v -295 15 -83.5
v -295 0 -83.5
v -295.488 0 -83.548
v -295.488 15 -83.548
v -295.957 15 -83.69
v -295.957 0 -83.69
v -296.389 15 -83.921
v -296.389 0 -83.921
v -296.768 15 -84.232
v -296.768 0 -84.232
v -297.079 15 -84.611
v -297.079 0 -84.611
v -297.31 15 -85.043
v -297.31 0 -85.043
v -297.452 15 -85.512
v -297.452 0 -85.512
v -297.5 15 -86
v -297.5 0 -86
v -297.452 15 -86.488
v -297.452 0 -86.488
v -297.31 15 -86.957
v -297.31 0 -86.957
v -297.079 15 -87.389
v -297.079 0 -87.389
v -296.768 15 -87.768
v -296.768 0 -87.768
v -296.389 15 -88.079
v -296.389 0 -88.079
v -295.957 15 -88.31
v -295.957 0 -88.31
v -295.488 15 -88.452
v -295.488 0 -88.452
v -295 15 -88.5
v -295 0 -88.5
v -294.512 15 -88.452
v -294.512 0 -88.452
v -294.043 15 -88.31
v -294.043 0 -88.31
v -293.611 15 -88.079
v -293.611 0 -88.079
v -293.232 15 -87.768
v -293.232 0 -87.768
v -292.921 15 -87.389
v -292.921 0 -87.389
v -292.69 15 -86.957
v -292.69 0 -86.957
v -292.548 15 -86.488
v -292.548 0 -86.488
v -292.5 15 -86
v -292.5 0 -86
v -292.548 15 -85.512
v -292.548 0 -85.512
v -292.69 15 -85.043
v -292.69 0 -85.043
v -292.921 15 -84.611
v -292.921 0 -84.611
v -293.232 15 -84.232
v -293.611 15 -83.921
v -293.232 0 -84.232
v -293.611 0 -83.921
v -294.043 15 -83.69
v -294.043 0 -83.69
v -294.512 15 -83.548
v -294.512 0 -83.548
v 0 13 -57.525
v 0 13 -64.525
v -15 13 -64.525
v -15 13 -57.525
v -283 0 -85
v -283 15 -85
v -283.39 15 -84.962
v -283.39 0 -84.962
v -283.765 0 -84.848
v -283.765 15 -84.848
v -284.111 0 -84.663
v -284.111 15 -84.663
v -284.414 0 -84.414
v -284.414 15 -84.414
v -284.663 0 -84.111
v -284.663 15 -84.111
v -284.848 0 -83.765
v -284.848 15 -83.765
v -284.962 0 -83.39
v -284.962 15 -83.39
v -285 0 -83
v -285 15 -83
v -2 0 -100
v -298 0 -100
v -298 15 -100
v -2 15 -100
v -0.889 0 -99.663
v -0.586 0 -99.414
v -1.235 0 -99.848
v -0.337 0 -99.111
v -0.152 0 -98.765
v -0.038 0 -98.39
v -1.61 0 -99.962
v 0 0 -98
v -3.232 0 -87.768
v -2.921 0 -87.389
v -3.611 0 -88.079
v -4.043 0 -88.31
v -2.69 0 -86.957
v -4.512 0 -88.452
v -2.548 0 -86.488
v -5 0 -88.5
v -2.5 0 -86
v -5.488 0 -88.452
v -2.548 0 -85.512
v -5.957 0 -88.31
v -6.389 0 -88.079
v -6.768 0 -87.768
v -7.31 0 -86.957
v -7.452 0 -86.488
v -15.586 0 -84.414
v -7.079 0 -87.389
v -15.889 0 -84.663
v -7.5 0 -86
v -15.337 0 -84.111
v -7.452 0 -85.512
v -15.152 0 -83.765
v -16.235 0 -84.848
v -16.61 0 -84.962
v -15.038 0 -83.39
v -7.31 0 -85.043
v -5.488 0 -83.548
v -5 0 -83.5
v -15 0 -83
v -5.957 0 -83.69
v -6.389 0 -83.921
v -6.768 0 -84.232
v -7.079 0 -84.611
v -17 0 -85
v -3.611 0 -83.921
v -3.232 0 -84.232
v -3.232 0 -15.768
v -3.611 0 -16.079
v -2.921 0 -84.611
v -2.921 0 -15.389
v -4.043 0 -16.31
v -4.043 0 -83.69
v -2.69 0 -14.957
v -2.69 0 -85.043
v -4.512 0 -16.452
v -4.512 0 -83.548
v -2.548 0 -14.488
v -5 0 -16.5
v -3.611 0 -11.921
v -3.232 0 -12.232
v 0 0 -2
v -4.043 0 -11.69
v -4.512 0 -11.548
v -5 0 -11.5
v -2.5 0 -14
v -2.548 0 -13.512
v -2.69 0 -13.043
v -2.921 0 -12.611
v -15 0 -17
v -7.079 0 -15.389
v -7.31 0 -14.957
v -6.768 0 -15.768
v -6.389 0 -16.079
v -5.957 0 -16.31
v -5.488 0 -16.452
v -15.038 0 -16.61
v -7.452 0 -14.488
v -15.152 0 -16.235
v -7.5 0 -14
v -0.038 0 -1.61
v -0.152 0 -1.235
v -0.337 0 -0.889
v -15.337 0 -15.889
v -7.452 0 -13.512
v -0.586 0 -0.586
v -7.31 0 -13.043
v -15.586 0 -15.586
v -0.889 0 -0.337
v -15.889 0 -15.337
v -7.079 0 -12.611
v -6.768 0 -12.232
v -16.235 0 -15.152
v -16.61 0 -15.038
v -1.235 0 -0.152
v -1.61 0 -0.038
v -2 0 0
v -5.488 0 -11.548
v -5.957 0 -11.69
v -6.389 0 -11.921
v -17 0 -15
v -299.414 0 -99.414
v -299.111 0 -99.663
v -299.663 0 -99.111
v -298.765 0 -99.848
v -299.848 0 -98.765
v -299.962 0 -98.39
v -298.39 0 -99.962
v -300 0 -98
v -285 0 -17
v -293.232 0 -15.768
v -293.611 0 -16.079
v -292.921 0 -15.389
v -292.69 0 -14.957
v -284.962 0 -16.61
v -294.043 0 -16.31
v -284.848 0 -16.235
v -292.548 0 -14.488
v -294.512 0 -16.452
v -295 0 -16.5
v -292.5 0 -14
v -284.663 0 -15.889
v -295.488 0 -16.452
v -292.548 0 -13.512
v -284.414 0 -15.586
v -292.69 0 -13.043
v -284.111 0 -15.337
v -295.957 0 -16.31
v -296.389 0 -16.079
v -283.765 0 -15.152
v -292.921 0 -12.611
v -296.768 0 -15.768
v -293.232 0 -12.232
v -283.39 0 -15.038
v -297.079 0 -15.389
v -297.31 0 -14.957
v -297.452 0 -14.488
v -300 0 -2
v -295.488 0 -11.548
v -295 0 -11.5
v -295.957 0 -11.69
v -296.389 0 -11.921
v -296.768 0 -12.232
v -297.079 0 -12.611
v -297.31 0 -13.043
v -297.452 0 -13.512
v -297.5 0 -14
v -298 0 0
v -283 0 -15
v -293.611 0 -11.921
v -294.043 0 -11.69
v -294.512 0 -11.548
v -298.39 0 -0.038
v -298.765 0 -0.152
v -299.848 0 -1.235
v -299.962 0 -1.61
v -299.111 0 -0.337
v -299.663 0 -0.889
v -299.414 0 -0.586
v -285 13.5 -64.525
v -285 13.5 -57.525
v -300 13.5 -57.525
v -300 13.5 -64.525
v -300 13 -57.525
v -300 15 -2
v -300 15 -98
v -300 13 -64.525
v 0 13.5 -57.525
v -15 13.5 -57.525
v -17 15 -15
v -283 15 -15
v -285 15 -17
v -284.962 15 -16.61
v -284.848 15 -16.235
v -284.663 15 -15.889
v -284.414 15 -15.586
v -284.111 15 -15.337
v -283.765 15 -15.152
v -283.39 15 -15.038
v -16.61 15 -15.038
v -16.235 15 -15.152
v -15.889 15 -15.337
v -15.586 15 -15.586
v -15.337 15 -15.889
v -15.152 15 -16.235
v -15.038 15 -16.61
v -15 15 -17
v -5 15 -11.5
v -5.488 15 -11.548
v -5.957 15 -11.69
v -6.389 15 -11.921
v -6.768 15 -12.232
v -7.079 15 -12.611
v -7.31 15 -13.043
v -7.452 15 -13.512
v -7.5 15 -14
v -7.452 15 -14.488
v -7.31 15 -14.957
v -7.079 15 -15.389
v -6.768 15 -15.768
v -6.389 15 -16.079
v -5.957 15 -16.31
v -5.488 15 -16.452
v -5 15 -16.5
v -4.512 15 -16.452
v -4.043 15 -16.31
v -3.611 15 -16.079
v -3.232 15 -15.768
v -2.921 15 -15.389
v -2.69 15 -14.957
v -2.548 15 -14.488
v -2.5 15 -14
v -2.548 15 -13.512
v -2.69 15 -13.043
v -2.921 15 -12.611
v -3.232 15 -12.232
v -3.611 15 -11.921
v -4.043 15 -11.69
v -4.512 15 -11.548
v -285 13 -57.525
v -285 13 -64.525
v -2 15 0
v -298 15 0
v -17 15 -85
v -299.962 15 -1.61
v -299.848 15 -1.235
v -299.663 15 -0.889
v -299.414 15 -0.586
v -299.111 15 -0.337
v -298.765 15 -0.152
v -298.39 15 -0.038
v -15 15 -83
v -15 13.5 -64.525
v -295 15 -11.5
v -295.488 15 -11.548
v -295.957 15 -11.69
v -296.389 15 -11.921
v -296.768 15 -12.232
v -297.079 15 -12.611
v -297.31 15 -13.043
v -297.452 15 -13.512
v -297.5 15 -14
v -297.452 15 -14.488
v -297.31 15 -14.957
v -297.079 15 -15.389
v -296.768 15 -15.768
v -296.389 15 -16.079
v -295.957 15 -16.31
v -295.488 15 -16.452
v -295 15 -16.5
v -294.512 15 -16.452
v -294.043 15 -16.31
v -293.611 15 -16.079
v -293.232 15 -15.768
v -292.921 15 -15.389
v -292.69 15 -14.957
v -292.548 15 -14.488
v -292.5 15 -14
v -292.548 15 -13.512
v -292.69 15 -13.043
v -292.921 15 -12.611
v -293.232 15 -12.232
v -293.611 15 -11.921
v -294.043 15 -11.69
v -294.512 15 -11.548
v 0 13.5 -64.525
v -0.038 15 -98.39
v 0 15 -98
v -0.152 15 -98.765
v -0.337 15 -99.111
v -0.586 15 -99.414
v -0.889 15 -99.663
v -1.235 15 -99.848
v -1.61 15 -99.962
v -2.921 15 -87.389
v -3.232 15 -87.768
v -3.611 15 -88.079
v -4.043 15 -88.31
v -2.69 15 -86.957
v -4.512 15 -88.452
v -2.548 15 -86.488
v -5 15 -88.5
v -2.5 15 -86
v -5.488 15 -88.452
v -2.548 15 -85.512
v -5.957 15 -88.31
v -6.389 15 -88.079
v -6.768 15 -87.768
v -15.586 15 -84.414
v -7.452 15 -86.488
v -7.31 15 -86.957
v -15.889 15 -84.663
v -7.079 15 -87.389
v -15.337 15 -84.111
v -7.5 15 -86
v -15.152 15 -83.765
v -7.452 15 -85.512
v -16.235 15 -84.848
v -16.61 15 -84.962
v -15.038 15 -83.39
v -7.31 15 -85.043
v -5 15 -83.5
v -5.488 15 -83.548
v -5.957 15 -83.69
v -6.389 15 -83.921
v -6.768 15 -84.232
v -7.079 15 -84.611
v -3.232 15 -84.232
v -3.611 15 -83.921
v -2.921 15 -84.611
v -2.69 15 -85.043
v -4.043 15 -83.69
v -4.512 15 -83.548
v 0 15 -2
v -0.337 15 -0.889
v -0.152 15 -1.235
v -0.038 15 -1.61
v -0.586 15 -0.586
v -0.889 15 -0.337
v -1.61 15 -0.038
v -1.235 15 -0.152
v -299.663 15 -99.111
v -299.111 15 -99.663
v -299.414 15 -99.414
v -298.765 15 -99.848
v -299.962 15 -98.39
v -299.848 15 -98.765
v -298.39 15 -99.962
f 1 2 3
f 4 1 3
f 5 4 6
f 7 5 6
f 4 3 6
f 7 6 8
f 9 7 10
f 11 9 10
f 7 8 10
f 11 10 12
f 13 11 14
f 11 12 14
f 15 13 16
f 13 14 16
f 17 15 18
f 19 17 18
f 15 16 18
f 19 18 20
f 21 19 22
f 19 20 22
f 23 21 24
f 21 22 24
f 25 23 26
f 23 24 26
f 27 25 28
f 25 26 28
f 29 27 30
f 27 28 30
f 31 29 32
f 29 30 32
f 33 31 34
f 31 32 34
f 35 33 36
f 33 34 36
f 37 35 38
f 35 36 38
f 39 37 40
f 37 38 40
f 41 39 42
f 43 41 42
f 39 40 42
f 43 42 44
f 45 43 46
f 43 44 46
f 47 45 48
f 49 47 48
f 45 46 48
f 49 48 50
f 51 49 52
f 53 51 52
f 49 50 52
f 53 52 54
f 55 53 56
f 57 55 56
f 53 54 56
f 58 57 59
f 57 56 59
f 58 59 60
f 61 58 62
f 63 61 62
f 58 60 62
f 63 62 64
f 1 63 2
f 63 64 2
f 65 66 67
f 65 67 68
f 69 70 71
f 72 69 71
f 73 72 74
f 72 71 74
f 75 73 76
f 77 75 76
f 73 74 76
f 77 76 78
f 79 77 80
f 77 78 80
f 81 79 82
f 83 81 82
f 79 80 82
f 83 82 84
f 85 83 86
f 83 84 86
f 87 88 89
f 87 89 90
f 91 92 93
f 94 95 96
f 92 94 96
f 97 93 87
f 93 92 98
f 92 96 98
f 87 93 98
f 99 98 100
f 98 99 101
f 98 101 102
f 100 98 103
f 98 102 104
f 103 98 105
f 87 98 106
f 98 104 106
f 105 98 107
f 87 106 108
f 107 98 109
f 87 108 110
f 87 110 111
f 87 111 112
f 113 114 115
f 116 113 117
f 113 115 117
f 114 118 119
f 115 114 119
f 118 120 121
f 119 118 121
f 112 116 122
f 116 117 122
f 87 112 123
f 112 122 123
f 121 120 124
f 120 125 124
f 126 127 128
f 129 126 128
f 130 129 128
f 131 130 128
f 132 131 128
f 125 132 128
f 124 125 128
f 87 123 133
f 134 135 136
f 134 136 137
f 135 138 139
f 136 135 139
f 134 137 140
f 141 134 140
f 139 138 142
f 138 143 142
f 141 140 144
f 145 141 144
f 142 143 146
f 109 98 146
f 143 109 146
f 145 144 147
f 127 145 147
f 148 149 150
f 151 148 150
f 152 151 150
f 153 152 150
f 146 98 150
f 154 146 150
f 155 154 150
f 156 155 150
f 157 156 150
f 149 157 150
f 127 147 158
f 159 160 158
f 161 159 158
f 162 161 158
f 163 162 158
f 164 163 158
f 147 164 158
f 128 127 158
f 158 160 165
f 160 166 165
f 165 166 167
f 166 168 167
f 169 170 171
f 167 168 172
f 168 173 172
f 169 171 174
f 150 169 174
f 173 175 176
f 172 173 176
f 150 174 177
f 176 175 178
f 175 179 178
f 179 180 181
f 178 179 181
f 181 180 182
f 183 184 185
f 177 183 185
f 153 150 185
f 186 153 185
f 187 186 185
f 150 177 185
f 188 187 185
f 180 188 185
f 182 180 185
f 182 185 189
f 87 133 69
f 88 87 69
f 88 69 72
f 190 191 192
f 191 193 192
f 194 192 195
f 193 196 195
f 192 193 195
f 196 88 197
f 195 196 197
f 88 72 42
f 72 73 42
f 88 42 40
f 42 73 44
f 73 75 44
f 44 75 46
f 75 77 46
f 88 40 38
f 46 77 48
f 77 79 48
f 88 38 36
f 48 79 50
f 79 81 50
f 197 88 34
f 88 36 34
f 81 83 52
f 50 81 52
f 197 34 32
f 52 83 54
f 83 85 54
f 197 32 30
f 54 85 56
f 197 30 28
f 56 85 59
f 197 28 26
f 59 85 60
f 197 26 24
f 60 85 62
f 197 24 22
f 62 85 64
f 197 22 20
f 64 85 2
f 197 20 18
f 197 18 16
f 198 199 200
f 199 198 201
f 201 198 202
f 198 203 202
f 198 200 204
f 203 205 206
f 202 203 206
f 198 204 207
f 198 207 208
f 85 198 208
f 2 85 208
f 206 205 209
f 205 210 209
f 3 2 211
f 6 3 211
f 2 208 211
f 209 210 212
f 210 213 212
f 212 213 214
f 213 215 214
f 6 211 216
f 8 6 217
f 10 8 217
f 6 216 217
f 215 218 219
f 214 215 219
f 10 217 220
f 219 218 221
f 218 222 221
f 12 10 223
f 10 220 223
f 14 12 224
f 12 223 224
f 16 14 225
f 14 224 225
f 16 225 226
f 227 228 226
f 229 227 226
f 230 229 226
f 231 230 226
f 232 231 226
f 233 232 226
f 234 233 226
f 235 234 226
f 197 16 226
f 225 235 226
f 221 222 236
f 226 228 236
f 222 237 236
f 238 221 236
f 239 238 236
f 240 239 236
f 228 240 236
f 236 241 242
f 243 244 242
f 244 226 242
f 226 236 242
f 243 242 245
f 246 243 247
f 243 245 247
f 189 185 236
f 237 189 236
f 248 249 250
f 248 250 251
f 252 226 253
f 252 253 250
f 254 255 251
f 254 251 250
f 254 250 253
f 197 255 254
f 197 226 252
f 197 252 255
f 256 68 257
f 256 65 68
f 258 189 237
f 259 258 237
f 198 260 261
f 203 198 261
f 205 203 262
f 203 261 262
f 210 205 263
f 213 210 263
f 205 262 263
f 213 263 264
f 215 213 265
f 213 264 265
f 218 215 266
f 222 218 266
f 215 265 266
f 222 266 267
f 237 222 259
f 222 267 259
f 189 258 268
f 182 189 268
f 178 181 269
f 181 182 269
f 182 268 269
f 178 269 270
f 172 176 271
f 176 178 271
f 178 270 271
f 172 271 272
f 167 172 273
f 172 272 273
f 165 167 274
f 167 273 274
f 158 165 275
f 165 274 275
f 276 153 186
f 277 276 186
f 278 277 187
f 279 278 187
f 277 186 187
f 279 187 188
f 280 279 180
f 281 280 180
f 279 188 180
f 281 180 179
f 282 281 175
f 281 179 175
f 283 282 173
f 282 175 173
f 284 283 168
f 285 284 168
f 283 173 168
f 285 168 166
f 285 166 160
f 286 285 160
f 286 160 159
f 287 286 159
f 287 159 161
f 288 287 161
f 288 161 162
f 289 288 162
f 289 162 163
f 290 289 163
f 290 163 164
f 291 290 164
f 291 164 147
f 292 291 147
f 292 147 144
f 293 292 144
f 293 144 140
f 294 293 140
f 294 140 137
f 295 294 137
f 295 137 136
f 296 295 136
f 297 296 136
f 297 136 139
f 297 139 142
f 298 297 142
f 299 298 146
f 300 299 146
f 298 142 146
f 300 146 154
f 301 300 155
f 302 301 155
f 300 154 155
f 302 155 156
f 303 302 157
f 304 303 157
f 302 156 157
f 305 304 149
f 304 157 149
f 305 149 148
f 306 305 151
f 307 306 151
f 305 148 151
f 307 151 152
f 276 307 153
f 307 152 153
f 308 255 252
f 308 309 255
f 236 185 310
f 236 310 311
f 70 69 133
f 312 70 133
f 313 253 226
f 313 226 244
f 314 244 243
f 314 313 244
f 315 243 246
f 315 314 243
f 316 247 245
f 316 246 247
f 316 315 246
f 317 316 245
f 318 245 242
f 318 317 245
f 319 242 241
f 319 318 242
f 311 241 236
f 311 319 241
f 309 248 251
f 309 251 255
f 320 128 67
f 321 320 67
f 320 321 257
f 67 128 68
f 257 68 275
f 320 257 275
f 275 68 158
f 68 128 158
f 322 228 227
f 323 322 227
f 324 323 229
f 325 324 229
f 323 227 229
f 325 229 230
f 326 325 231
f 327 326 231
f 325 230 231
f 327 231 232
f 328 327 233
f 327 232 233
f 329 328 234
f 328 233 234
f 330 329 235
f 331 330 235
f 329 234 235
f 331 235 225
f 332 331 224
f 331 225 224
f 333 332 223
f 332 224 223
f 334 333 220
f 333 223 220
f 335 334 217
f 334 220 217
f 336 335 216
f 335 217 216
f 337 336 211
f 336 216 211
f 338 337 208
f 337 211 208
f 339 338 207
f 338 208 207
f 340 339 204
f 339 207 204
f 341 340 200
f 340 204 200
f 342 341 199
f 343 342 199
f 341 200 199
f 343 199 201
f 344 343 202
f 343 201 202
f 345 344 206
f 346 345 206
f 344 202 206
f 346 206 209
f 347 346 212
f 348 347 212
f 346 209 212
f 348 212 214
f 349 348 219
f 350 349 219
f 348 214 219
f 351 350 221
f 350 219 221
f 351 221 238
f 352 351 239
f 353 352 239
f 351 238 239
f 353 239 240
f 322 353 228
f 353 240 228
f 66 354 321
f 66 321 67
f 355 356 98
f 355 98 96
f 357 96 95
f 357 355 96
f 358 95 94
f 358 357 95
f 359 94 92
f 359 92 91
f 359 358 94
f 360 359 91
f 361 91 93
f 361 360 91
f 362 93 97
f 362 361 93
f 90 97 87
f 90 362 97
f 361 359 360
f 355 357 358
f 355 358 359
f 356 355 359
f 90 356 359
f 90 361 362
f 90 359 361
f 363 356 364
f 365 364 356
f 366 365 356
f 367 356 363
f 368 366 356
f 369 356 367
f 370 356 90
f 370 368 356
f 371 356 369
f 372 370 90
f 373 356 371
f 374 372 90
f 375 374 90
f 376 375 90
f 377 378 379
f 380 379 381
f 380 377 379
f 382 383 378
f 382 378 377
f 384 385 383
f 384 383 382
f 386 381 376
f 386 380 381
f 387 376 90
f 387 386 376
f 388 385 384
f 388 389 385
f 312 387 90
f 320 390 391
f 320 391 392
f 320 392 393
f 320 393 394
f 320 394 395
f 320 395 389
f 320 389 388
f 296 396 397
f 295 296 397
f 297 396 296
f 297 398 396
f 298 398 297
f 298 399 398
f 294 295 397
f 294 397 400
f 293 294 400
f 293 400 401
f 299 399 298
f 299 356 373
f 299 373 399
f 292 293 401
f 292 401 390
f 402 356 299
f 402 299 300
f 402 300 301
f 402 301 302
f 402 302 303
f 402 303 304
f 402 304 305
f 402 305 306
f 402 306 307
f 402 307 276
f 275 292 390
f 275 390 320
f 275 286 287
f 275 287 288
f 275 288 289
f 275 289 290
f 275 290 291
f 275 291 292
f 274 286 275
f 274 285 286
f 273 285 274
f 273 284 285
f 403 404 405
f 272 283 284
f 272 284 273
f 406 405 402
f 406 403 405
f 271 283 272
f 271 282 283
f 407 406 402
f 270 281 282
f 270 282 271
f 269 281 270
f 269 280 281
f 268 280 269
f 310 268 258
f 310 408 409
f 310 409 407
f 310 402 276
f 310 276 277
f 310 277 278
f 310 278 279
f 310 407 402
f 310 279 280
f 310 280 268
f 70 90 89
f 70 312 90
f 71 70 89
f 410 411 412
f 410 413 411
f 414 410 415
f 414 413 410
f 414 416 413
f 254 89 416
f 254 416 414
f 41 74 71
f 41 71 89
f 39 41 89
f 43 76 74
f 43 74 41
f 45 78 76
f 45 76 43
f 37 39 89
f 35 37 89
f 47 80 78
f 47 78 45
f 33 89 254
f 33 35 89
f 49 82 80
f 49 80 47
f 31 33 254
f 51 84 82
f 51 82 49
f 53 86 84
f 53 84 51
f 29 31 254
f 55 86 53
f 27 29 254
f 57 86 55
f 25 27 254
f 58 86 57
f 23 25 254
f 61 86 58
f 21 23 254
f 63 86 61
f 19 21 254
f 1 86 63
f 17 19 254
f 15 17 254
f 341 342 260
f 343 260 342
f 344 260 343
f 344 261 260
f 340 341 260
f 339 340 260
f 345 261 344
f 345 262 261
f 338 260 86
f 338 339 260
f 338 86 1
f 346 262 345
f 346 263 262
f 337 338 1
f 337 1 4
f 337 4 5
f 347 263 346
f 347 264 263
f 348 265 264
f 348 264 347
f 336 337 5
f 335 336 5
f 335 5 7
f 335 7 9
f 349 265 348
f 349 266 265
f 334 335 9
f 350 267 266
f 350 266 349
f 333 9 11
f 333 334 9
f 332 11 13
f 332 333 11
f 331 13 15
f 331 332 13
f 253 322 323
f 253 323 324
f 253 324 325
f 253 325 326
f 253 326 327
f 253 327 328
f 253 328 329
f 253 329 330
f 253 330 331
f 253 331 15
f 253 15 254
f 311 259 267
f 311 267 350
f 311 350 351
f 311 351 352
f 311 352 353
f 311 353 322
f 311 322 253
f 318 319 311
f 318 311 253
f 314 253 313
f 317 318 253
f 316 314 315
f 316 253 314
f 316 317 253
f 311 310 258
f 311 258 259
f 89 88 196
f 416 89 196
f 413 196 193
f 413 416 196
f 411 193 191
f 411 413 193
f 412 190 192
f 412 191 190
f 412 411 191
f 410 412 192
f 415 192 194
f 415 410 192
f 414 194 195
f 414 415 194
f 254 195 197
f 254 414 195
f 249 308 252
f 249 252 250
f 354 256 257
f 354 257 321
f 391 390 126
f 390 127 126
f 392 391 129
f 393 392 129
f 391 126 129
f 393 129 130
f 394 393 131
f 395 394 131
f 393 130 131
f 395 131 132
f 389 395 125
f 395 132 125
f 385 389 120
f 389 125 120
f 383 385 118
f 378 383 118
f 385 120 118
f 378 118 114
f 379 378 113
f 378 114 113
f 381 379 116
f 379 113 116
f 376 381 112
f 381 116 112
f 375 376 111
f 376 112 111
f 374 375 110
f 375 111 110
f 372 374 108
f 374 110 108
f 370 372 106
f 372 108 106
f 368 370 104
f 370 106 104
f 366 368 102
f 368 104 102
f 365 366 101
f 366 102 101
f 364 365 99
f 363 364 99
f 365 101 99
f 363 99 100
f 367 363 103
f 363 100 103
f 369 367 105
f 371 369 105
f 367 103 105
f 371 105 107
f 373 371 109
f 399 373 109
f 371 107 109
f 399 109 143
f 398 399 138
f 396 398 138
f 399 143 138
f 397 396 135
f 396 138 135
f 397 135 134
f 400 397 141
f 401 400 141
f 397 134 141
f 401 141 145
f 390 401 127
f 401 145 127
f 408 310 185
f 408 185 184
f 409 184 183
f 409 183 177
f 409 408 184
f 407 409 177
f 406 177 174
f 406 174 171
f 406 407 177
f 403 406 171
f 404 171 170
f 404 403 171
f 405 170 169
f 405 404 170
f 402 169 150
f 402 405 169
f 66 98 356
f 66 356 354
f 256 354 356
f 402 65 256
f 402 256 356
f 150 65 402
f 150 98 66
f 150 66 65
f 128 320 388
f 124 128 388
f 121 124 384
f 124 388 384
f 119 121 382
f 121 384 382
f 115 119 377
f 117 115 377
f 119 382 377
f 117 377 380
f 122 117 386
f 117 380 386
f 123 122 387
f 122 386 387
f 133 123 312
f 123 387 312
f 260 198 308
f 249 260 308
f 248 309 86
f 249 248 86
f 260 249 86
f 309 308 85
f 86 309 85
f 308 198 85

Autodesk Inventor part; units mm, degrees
ref_plane "YZ Plane" through (0, 0, 0) normal (1, 0, 0) x (0, 1, 0)
ref_plane "XZ Plane" through (0, 0, 0) normal (0, 1, 0) x (-1, 0, 0)
ref_plane "XY Plane" through (0, 0, 0) normal (0, 0, 1) x (1, 0, 0)
sketch "Szkic1" plane through (0, 0, 0) normal (0, 1, 0) x (-1, 0, 0)
  line L0 (0, 0) -> (300, 0)
  line L1 (300, 0) -> (300, -100)
  line L2 (300, -100) -> (0, -100)
  line L3 (0, -100) -> (0, 0)
  dimension "d0" = 100
  dimension "d1" = 300
sketch "Szkic2" plane through (0, 0, 0) normal (0, 1, 0) x (-1, 0, 0)
  line L0 (15, -15) -> (285, -15)
  line L1 (285, -15) -> (285, -85)
  line L2 (285, -85) -> (15, -85)
  line L3 (15, -85) -> (15, -15)
  point P0 (0, 0)
  dimension "d2" = 270
  dimension "d3" = 70
  dimension "d4" = 15
  dimension "d5" = 15
extrude "Wyciągnięcie proste1" add sketch "Szkic1" along normal blind 15
extrude "Wyciągnięcie proste2" cut sketch "Szkic2" along normal blind 15
fillet "Zaokrąglenie1" radius 2 8 edges at (-285, 7.5, -85) (-15, 7.5, -85) (-15, 7.5, -15) (-285, 7.5, -15) (-300, 7.5, 0) (-300, 7.5, -100) (0, 7.5, -100) (0, 7.5, 0)
sketch "Szkic3" plane through (0, 15, 0) normal (0, 1, 0) x (1, 0, 0)
  line L0 (0, 2) -> (0, 98) projected
  line L1 (-2, 100) -> (-298, 100) projected
  line L2 (-298, 0) -> (-2, 0) projected
  line L3 (-300, 98) -> (-300, 2) projected
  point P0 (0, 0)
  point P1 (-5, 86)
  point P2 (-5, 14)
  point P3 (-295, 86)
  point P4 (-295, 14)
  dimension "d11" = 5
  dimension "d12" = 14
  dimension "d13" = 14
  dimension "d14" = 14
  dimension "d15" = 5
  dimension "d16" = 5
  dimension "d17" = 5
  dimension "d18" = 14
hole "Otwór1" at (-5, 15, -86) at (-5, 15, -14) at (-295, 15, -86) at (-295, 15, -14) direction (0, -1, 0) diameter 5 depth 15 clearance for "Śruba ze łbem płaskim obrobiona" size "M4" standard "ANSI Profil metryczny M"
sketch "Szkic4" plane through (0, 15, 0) normal (0, 1, 0) x (1, 0, 0)
  point P0 (0, 0)
sketch "Szkic5" plane through (0, 0, -2) normal (1, 0, 0) x (0, 0, -1)
  line L0 (55.525, 13.5) -> (62.525, 13.5)
  line L1 (62.525, 13.5) -> (62.525, 13)
  line L2 (62.525, 13) -> (55.525, 13)
  line L3 (55.525, 13) -> (55.525, 13.5)
  line L4 (0, 15) -> (96, 15) projected
  line L5 (98, 0) -> (98, 15) projected
  point P0 (-2, 0)
  point P1 (62.525, 13.25)
  dimension "d26" = 7
  dimension "d27" = 0.5
  dimension "d28" = 1.5
  dimension "d29" = 35.475
extrude "Wyciągnięcie proste3" cut sketch "Szkic5" against normal through all
equation "\"d13\" = d12"
equation "\"d14\" = d12"
equation "\"d15\" = d11"
equation "\"d16\" = d11"
equation "\"d17\" = d11"
equation "\"d18\" = d12"
properties part number "podstawka_prowadzaca"
